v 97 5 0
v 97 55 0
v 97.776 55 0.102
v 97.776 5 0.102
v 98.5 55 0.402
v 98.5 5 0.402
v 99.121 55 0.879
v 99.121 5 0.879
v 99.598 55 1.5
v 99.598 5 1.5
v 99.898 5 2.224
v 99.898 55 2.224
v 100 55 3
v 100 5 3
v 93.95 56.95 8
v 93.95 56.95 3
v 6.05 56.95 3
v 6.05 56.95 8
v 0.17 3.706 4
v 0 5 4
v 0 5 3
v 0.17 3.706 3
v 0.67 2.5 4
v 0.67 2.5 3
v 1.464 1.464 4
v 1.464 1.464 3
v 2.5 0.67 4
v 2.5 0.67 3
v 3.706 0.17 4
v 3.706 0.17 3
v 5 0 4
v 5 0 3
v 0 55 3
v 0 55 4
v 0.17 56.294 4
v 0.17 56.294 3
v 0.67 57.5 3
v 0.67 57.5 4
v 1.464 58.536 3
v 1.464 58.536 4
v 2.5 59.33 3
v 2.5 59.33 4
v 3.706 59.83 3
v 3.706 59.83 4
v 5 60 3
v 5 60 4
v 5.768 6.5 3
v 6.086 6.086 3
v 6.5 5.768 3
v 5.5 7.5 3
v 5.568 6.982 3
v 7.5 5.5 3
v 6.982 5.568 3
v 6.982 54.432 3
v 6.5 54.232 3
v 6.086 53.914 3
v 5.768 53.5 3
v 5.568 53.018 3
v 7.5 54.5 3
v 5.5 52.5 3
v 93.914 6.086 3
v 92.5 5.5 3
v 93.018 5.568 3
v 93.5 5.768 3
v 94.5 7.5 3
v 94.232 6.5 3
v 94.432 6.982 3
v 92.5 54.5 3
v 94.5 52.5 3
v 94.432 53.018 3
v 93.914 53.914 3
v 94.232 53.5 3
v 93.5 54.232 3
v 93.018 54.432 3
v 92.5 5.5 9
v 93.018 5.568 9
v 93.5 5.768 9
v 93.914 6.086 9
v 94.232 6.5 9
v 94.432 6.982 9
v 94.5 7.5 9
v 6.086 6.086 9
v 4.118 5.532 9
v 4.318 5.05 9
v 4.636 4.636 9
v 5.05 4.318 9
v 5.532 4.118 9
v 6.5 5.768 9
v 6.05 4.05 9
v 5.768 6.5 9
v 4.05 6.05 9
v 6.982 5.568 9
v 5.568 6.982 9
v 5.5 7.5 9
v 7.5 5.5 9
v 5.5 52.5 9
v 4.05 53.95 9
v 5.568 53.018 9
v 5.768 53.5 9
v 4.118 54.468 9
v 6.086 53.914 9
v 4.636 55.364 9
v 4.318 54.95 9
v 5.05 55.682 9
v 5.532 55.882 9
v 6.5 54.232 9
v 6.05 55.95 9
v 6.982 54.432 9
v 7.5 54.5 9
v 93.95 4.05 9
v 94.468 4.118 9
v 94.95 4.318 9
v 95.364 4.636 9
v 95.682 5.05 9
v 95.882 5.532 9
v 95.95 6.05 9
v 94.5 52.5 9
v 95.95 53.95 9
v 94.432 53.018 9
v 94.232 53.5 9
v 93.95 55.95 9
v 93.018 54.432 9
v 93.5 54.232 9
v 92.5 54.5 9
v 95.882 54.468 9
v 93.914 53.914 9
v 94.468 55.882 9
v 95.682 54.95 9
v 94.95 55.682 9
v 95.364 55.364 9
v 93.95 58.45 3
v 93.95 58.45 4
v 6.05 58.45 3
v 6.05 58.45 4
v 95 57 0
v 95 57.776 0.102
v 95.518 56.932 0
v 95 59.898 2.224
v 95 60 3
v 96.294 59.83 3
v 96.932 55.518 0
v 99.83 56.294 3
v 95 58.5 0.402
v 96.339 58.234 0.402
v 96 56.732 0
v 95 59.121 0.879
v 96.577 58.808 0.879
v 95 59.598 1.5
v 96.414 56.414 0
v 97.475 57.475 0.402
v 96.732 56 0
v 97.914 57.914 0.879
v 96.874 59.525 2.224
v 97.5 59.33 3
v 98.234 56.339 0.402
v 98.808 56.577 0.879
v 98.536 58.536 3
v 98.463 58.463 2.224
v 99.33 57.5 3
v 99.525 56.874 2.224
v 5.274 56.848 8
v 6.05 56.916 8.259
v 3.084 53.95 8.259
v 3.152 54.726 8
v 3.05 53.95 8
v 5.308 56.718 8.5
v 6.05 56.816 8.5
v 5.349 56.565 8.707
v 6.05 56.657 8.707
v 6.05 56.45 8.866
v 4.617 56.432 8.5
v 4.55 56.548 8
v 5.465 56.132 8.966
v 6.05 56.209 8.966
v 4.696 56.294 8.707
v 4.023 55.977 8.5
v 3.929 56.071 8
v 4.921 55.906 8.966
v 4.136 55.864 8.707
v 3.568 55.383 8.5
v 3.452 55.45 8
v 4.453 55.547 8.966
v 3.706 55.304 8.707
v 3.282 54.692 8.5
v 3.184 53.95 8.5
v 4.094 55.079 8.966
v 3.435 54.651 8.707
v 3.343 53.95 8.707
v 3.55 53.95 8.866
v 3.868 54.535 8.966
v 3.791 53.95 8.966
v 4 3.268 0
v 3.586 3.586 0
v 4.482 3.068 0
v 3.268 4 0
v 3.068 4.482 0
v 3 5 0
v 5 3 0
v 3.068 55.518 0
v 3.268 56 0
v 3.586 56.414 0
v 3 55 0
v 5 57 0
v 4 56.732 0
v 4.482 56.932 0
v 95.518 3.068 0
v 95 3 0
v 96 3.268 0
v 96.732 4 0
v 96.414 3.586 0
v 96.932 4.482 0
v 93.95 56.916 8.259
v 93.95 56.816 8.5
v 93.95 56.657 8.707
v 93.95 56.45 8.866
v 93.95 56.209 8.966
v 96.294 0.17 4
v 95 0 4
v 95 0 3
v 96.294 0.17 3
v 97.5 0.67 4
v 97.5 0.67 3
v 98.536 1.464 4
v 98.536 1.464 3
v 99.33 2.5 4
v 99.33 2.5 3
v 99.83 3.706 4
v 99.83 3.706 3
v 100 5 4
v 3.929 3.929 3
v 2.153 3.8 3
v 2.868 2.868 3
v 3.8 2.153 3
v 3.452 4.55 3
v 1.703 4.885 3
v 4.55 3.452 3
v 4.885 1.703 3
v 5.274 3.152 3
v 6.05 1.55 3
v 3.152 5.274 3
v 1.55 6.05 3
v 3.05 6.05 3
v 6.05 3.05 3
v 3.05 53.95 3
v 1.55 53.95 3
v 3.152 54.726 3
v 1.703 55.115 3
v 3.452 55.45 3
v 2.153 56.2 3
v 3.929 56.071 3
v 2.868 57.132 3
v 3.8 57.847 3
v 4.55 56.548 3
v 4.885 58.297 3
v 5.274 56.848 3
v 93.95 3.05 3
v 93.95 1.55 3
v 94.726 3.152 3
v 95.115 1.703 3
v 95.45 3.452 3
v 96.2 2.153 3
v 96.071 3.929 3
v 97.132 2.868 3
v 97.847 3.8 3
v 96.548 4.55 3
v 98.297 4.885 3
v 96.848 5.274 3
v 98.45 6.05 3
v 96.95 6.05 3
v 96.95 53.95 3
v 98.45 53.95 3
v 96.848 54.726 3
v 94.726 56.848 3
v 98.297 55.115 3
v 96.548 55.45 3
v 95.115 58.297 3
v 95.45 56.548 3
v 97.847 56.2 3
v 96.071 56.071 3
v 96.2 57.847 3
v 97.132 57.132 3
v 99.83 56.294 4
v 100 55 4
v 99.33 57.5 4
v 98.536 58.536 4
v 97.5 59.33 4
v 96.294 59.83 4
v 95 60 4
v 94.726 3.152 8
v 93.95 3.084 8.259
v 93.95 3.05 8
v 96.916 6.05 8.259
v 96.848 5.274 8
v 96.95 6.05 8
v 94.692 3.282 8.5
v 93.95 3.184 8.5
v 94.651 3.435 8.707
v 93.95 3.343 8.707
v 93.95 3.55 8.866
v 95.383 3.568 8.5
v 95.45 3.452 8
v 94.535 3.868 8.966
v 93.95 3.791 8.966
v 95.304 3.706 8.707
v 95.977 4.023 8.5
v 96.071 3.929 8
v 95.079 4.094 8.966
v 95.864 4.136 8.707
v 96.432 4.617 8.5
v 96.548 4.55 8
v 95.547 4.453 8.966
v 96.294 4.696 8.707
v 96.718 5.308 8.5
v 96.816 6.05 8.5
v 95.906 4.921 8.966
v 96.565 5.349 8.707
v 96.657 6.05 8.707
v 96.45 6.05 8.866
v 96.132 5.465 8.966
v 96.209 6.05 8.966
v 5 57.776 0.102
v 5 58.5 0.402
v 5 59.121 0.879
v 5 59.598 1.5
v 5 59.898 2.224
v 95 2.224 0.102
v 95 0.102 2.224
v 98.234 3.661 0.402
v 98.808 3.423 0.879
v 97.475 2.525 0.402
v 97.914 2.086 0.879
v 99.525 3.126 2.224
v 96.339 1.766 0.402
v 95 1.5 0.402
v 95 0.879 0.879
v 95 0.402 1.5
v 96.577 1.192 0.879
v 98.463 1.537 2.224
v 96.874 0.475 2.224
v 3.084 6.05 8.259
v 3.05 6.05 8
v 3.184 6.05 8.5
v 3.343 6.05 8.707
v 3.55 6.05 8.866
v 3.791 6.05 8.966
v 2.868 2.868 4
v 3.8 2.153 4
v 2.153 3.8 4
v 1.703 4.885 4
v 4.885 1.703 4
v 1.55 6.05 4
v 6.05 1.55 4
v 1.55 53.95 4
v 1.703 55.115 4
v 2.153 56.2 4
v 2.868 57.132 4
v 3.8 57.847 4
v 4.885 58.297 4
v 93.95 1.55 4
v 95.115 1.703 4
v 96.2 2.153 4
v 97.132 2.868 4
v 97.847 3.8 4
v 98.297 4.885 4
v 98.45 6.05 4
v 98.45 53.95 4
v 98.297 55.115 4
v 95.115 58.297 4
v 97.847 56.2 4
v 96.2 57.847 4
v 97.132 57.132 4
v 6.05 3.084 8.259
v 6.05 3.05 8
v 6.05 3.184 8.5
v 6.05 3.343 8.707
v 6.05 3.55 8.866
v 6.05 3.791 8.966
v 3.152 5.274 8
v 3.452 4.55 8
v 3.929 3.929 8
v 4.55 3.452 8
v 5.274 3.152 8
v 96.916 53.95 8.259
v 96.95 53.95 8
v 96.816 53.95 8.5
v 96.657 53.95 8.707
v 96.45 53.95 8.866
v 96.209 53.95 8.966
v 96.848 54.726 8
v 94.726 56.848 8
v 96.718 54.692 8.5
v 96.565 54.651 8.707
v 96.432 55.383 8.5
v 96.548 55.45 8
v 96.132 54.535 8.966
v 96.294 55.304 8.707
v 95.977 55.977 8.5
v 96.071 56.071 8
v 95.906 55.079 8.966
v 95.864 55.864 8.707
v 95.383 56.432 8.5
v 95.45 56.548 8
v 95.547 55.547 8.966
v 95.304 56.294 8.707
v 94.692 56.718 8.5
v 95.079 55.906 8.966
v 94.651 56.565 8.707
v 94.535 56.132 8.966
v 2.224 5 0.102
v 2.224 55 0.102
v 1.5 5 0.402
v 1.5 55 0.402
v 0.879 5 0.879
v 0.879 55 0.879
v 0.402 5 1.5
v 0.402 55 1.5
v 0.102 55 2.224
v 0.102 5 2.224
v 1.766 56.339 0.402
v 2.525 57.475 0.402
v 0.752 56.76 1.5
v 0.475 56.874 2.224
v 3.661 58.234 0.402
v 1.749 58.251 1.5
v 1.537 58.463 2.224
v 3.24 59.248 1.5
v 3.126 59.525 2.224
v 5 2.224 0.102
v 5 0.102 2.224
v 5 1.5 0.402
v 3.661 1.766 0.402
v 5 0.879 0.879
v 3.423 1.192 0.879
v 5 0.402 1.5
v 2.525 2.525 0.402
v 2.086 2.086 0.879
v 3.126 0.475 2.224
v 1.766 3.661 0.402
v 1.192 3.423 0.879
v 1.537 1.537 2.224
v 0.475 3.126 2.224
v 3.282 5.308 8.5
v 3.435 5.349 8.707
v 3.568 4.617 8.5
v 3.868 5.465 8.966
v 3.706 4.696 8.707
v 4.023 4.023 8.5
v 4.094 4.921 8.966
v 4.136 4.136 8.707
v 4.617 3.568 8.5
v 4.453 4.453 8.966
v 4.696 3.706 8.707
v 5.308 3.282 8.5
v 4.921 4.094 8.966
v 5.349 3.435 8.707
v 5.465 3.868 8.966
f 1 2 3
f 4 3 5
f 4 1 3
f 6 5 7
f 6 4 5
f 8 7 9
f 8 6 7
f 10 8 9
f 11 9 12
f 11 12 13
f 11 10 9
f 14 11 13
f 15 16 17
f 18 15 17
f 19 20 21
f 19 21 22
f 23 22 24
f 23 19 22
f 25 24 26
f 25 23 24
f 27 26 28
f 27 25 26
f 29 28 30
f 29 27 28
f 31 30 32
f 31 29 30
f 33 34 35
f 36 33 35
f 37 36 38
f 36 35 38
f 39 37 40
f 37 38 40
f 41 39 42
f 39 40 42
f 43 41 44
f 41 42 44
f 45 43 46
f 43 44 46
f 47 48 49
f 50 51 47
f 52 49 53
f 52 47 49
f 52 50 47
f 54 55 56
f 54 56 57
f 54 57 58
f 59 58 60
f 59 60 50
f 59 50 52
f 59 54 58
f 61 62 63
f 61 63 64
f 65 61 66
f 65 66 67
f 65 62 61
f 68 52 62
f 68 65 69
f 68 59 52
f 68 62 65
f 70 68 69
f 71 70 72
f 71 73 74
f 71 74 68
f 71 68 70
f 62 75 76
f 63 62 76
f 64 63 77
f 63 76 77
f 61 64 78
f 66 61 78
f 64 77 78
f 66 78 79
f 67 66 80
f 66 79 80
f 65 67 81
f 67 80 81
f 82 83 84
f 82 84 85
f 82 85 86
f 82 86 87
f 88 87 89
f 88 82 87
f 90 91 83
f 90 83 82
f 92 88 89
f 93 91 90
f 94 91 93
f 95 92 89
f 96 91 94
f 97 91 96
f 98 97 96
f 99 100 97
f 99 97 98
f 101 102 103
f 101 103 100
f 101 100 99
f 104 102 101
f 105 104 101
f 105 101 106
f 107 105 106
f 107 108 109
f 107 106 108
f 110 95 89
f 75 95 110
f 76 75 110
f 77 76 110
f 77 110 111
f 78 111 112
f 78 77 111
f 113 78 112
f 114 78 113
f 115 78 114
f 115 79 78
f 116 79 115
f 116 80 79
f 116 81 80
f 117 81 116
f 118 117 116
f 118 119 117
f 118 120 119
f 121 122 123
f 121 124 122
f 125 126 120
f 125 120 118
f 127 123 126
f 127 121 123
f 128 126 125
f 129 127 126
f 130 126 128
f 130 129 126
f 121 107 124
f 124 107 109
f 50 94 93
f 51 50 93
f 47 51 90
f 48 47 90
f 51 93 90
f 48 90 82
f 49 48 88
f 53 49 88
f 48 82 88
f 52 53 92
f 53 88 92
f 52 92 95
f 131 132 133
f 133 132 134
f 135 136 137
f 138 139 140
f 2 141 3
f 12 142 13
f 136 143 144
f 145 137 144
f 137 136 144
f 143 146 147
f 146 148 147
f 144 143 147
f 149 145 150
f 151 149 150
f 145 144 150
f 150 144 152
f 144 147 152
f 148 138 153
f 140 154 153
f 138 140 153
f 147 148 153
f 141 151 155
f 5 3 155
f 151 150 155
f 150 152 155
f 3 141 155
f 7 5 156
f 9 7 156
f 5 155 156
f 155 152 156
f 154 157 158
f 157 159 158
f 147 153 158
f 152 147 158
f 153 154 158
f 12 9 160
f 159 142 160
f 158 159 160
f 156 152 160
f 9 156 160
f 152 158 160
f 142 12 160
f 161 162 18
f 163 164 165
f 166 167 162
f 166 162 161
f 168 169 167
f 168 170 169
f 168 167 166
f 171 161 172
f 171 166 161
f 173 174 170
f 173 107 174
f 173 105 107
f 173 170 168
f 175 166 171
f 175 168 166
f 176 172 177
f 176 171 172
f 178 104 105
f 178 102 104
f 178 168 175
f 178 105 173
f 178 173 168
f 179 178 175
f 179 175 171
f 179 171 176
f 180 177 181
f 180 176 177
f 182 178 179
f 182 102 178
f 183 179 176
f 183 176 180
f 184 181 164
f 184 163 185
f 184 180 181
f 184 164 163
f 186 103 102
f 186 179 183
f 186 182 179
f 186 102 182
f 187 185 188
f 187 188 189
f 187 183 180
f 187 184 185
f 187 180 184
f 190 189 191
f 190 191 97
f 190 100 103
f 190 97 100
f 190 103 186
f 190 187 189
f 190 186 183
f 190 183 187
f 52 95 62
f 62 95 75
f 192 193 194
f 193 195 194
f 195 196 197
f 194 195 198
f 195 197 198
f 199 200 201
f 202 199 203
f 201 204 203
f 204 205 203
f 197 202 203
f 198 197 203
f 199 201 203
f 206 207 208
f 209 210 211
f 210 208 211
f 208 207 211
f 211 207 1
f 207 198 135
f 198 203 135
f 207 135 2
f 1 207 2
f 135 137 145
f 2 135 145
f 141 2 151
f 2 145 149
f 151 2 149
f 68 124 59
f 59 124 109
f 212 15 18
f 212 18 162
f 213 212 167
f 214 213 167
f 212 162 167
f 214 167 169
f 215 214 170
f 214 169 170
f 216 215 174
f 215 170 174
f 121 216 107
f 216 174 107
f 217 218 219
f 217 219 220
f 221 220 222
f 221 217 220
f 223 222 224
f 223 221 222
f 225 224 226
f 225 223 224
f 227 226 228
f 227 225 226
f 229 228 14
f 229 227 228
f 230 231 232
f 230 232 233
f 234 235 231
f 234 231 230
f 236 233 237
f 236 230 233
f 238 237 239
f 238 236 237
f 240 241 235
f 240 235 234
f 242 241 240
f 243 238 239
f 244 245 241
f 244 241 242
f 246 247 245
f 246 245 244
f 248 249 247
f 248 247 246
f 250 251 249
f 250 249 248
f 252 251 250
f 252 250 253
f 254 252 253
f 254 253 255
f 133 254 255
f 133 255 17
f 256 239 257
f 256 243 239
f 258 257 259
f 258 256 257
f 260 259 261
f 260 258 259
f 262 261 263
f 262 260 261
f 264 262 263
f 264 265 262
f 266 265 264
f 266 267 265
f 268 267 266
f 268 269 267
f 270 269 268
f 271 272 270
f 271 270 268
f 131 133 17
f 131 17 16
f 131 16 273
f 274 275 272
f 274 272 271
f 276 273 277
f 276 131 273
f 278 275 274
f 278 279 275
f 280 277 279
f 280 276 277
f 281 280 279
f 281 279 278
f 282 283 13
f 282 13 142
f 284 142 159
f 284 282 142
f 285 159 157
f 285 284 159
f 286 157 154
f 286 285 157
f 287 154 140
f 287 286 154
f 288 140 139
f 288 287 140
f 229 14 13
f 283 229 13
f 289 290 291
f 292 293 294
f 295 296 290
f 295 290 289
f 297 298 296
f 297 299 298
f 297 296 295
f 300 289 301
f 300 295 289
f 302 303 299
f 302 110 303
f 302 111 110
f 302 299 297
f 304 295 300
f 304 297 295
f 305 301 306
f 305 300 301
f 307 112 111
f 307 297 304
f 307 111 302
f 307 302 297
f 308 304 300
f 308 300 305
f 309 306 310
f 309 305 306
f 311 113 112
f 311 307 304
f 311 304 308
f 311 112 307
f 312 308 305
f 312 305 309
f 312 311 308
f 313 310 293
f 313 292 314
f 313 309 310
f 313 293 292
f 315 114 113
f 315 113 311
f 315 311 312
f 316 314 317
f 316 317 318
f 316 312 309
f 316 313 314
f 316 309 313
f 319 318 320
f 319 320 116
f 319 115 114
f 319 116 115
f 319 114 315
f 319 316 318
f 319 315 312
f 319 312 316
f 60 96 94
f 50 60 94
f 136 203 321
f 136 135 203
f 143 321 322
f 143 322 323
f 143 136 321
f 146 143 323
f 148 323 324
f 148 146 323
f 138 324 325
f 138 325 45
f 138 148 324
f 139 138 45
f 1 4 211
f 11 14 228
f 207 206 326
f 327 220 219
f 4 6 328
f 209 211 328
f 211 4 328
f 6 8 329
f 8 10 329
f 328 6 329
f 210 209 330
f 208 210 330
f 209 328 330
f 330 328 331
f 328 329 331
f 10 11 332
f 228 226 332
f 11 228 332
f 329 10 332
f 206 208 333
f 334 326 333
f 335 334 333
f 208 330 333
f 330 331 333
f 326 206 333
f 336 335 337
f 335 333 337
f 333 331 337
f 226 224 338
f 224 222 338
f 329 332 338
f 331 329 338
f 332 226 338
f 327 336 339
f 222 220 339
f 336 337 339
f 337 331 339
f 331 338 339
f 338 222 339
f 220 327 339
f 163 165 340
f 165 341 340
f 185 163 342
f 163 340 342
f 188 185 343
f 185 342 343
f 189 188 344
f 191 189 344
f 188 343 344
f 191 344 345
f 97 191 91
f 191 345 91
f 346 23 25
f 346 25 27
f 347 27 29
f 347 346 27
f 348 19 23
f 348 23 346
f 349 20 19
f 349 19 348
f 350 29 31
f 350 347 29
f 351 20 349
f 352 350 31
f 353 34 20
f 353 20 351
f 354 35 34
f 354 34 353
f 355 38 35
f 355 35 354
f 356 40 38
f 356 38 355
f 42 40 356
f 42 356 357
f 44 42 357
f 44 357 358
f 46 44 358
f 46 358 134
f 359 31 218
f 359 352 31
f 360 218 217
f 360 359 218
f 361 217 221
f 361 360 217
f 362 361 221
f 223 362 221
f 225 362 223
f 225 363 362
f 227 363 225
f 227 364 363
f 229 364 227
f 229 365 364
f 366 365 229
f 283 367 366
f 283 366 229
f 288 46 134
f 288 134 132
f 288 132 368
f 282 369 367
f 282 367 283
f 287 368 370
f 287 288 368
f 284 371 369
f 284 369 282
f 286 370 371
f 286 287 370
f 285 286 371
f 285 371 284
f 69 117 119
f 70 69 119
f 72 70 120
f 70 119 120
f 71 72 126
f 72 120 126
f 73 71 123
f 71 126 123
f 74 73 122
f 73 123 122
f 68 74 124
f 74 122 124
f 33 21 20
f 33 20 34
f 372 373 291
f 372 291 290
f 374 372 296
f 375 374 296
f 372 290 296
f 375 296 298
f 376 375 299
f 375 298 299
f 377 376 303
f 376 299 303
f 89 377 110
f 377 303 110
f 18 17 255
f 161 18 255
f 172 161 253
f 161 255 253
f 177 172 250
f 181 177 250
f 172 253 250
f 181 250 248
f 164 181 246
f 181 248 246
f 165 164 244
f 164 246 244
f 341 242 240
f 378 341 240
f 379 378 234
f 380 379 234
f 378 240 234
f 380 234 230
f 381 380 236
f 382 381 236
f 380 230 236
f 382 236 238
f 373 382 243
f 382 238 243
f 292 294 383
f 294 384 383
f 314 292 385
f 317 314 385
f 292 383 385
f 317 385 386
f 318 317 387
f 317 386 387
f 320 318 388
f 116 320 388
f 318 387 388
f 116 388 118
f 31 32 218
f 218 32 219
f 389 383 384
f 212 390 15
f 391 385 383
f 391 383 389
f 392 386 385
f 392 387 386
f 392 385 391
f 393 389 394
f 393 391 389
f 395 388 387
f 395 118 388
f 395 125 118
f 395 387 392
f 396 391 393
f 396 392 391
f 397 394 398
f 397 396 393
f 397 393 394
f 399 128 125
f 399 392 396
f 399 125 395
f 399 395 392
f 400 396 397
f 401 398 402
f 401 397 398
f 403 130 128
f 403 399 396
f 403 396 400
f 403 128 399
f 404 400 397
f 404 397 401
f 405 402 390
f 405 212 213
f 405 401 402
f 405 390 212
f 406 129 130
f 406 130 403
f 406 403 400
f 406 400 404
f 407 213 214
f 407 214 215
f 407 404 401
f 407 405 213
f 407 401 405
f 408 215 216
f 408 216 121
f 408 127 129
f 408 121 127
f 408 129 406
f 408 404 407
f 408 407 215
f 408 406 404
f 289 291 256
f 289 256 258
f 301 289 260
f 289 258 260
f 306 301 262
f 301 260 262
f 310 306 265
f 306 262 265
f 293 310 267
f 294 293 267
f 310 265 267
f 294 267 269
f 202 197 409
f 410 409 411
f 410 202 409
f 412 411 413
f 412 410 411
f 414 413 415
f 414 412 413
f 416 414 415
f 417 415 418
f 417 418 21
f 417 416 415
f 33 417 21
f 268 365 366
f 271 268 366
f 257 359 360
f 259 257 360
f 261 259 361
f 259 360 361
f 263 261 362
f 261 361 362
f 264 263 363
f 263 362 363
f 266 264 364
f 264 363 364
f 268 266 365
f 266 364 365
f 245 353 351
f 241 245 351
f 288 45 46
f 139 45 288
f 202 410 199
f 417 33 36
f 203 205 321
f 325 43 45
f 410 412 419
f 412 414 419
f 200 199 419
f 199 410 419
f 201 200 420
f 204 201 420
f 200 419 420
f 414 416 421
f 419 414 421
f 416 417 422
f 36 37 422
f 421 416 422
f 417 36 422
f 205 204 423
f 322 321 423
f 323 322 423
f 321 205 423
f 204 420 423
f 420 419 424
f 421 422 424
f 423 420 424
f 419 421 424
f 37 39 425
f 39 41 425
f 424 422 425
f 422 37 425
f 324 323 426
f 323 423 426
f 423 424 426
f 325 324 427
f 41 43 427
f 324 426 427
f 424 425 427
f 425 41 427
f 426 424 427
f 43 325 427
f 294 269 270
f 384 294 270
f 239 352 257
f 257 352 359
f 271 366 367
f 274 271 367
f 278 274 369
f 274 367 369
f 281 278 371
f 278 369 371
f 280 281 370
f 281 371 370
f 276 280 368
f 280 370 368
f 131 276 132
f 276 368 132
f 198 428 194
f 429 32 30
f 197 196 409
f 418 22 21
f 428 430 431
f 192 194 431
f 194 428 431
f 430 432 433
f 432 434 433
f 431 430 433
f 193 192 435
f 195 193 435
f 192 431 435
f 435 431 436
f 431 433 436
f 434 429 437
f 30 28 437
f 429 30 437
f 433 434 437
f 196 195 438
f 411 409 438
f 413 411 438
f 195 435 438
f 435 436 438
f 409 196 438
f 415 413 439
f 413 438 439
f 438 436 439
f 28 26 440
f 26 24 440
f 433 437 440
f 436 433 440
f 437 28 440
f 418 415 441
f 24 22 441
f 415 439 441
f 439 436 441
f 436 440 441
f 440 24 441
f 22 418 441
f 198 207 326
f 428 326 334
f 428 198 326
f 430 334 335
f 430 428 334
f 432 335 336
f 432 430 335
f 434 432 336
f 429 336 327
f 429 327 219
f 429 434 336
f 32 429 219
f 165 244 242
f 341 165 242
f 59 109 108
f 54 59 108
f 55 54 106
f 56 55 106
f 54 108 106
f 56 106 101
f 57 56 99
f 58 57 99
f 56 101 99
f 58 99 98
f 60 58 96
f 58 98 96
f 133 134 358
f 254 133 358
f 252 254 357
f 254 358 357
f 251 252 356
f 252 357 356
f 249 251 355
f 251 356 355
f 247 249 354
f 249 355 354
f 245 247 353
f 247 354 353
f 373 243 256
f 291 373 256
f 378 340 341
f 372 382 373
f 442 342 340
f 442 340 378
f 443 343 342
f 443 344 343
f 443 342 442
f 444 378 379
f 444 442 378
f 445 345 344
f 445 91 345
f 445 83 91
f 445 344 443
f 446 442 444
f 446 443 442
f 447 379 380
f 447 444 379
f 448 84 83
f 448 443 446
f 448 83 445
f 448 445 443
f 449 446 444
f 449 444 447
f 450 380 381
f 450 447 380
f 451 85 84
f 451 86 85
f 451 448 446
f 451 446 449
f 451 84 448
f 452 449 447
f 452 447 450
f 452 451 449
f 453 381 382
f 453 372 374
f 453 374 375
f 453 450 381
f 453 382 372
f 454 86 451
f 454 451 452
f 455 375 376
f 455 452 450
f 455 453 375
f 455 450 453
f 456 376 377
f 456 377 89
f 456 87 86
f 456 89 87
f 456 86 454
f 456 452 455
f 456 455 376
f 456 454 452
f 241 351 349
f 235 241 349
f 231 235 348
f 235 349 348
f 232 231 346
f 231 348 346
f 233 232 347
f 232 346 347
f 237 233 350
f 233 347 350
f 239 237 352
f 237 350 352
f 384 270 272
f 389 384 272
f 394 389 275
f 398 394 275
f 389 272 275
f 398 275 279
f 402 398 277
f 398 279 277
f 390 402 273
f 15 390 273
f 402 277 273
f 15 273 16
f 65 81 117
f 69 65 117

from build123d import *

# Parameters (mm, degrees)
SKETCH_W        = 100
SKETCH_H        = 60
PAD_DEPTH       = 4
FILLET_R        = 5
FILLET001_R     = 3
POCKET001_DEPTH = 1
PAD001_DEPTH    = 5
POCKET_DEPTH    = 6
FILLET002_R     = 1


with BuildPart() as part:
    # Sketch → Pad (new body)
    with BuildSketch(Plane.XY):
        with Locations((50, 30)):
            Rectangle(SKETCH_W, SKETCH_H)
    extrude(amount=PAD_DEPTH)

    # Fillet
    fillet_edges = [part.edges().sort_by_distance(p)[0] for p in [
        (100, 0, 2),
        (0, 0, 2),
        (100, 60, 2),
        (0, 60, 2),
    ]]
    fillet(fillet_edges, radius=FILLET_R)

    # Fillet001
    fillet001_edges = [part.edges().sort_by_distance(p)[0] for p in [
        (50, 60, 0),
    ]]
    fillet(fillet001_edges, radius=FILLET001_R)

    # Sketch008 (on Face6 of Pad) → Pocket001 (cut)
    with BuildSketch(Plane.XY.offset(4)):
        with BuildLine():
            Line((6.05, 1.55), (93.95, 1.55))
            ThreePointArc((93.95, 1.55), (97.131981, 2.868019), (98.45, 6.05))
            Line((98.45, 6.05), (98.45, 53.95))
            ThreePointArc((98.45, 53.95), (97.131981, 57.131981), (93.95, 58.45))
            Line((93.95, 58.45), (6.05, 58.45))
            ThreePointArc((6.05, 58.45), (2.868019, 57.131981), (1.55, 53.95))
            Line((1.55, 53.95), (1.55, 6.05))
            ThreePointArc((1.55, 6.05), (2.868019, 2.868019), (6.05, 1.55))
        make_face()
        with BuildLine():
            Line((6.05, 3.05), (93.95, 3.05))
            ThreePointArc((93.95, 3.05), (96.07132, 3.92868), (96.95, 6.05))
            Line((96.95, 6.05), (96.95, 53.95))
            ThreePointArc((96.95, 53.95), (96.07132, 56.07132), (93.95, 56.95))
            Line((93.95, 56.95), (6.05, 56.95))
            ThreePointArc((6.05, 56.95), (3.92868, 56.07132), (3.05, 53.95))
            Line((3.05, 53.95), (3.05, 6.05))
            ThreePointArc((3.05, 6.05), (3.92868, 3.92868), (6.05, 3.05))
        make_face(mode=Mode.SUBTRACT)
    extrude(amount=-POCKET001_DEPTH, mode=Mode.SUBTRACT)

    # Sketch001 (on Face6 of Pad) → Pad001 (join)
    with BuildSketch(Plane.XY.offset(4)):
        with BuildLine():
            Line((6.05, 3.05), (93.95, 3.05))
            ThreePointArc((93.95, 3.05), (96.07132, 3.92868), (96.95, 6.05))
            Line((96.95, 6.05), (96.95, 53.95))
            ThreePointArc((96.95, 53.95), (96.07132, 56.07132), (93.95, 56.95))
            Line((93.95, 56.95), (6.05, 56.95))
            ThreePointArc((6.05, 56.95), (3.92868, 56.07132), (3.05, 53.95))
            Line((3.05, 53.95), (3.05, 6.05))
            ThreePointArc((3.05, 6.05), (3.92868, 3.92868), (6.05, 3.05))
        make_face()
    extrude(amount=PAD001_DEPTH)

    # Sketch009 (on Face44 of Pad001) → Pocket (cut)
    with BuildSketch(Plane.XY.offset(9)):
        with BuildLine():
            Line((7.5, 5.5), (92.5, 5.5))
            ThreePointArc((92.5, 5.5), (93.914214, 6.085786), (94.5, 7.5))
            Line((94.5, 7.5), (94.5, 52.5))
            ThreePointArc((94.5, 52.5), (93.914214, 53.914214), (92.5, 54.5))
            Line((92.5, 54.5), (7.5, 54.5))
            ThreePointArc((7.5, 54.5), (6.085786, 53.914214), (5.5, 52.5))
            Line((5.5, 52.5), (5.5, 7.5))
            ThreePointArc((5.5, 7.5), (6.085786, 6.085786), (7.5, 5.5))
        make_face()
    extrude(amount=-POCKET_DEPTH, mode=Mode.SUBTRACT)

    # Fillet002
    fillet002_edges = [part.edges().sort_by_distance(p)[0] for p in [
        (50, 3.05, 9),
    ]]
    fillet(fillet002_edges, radius=FILLET002_R)


solid = part.part
